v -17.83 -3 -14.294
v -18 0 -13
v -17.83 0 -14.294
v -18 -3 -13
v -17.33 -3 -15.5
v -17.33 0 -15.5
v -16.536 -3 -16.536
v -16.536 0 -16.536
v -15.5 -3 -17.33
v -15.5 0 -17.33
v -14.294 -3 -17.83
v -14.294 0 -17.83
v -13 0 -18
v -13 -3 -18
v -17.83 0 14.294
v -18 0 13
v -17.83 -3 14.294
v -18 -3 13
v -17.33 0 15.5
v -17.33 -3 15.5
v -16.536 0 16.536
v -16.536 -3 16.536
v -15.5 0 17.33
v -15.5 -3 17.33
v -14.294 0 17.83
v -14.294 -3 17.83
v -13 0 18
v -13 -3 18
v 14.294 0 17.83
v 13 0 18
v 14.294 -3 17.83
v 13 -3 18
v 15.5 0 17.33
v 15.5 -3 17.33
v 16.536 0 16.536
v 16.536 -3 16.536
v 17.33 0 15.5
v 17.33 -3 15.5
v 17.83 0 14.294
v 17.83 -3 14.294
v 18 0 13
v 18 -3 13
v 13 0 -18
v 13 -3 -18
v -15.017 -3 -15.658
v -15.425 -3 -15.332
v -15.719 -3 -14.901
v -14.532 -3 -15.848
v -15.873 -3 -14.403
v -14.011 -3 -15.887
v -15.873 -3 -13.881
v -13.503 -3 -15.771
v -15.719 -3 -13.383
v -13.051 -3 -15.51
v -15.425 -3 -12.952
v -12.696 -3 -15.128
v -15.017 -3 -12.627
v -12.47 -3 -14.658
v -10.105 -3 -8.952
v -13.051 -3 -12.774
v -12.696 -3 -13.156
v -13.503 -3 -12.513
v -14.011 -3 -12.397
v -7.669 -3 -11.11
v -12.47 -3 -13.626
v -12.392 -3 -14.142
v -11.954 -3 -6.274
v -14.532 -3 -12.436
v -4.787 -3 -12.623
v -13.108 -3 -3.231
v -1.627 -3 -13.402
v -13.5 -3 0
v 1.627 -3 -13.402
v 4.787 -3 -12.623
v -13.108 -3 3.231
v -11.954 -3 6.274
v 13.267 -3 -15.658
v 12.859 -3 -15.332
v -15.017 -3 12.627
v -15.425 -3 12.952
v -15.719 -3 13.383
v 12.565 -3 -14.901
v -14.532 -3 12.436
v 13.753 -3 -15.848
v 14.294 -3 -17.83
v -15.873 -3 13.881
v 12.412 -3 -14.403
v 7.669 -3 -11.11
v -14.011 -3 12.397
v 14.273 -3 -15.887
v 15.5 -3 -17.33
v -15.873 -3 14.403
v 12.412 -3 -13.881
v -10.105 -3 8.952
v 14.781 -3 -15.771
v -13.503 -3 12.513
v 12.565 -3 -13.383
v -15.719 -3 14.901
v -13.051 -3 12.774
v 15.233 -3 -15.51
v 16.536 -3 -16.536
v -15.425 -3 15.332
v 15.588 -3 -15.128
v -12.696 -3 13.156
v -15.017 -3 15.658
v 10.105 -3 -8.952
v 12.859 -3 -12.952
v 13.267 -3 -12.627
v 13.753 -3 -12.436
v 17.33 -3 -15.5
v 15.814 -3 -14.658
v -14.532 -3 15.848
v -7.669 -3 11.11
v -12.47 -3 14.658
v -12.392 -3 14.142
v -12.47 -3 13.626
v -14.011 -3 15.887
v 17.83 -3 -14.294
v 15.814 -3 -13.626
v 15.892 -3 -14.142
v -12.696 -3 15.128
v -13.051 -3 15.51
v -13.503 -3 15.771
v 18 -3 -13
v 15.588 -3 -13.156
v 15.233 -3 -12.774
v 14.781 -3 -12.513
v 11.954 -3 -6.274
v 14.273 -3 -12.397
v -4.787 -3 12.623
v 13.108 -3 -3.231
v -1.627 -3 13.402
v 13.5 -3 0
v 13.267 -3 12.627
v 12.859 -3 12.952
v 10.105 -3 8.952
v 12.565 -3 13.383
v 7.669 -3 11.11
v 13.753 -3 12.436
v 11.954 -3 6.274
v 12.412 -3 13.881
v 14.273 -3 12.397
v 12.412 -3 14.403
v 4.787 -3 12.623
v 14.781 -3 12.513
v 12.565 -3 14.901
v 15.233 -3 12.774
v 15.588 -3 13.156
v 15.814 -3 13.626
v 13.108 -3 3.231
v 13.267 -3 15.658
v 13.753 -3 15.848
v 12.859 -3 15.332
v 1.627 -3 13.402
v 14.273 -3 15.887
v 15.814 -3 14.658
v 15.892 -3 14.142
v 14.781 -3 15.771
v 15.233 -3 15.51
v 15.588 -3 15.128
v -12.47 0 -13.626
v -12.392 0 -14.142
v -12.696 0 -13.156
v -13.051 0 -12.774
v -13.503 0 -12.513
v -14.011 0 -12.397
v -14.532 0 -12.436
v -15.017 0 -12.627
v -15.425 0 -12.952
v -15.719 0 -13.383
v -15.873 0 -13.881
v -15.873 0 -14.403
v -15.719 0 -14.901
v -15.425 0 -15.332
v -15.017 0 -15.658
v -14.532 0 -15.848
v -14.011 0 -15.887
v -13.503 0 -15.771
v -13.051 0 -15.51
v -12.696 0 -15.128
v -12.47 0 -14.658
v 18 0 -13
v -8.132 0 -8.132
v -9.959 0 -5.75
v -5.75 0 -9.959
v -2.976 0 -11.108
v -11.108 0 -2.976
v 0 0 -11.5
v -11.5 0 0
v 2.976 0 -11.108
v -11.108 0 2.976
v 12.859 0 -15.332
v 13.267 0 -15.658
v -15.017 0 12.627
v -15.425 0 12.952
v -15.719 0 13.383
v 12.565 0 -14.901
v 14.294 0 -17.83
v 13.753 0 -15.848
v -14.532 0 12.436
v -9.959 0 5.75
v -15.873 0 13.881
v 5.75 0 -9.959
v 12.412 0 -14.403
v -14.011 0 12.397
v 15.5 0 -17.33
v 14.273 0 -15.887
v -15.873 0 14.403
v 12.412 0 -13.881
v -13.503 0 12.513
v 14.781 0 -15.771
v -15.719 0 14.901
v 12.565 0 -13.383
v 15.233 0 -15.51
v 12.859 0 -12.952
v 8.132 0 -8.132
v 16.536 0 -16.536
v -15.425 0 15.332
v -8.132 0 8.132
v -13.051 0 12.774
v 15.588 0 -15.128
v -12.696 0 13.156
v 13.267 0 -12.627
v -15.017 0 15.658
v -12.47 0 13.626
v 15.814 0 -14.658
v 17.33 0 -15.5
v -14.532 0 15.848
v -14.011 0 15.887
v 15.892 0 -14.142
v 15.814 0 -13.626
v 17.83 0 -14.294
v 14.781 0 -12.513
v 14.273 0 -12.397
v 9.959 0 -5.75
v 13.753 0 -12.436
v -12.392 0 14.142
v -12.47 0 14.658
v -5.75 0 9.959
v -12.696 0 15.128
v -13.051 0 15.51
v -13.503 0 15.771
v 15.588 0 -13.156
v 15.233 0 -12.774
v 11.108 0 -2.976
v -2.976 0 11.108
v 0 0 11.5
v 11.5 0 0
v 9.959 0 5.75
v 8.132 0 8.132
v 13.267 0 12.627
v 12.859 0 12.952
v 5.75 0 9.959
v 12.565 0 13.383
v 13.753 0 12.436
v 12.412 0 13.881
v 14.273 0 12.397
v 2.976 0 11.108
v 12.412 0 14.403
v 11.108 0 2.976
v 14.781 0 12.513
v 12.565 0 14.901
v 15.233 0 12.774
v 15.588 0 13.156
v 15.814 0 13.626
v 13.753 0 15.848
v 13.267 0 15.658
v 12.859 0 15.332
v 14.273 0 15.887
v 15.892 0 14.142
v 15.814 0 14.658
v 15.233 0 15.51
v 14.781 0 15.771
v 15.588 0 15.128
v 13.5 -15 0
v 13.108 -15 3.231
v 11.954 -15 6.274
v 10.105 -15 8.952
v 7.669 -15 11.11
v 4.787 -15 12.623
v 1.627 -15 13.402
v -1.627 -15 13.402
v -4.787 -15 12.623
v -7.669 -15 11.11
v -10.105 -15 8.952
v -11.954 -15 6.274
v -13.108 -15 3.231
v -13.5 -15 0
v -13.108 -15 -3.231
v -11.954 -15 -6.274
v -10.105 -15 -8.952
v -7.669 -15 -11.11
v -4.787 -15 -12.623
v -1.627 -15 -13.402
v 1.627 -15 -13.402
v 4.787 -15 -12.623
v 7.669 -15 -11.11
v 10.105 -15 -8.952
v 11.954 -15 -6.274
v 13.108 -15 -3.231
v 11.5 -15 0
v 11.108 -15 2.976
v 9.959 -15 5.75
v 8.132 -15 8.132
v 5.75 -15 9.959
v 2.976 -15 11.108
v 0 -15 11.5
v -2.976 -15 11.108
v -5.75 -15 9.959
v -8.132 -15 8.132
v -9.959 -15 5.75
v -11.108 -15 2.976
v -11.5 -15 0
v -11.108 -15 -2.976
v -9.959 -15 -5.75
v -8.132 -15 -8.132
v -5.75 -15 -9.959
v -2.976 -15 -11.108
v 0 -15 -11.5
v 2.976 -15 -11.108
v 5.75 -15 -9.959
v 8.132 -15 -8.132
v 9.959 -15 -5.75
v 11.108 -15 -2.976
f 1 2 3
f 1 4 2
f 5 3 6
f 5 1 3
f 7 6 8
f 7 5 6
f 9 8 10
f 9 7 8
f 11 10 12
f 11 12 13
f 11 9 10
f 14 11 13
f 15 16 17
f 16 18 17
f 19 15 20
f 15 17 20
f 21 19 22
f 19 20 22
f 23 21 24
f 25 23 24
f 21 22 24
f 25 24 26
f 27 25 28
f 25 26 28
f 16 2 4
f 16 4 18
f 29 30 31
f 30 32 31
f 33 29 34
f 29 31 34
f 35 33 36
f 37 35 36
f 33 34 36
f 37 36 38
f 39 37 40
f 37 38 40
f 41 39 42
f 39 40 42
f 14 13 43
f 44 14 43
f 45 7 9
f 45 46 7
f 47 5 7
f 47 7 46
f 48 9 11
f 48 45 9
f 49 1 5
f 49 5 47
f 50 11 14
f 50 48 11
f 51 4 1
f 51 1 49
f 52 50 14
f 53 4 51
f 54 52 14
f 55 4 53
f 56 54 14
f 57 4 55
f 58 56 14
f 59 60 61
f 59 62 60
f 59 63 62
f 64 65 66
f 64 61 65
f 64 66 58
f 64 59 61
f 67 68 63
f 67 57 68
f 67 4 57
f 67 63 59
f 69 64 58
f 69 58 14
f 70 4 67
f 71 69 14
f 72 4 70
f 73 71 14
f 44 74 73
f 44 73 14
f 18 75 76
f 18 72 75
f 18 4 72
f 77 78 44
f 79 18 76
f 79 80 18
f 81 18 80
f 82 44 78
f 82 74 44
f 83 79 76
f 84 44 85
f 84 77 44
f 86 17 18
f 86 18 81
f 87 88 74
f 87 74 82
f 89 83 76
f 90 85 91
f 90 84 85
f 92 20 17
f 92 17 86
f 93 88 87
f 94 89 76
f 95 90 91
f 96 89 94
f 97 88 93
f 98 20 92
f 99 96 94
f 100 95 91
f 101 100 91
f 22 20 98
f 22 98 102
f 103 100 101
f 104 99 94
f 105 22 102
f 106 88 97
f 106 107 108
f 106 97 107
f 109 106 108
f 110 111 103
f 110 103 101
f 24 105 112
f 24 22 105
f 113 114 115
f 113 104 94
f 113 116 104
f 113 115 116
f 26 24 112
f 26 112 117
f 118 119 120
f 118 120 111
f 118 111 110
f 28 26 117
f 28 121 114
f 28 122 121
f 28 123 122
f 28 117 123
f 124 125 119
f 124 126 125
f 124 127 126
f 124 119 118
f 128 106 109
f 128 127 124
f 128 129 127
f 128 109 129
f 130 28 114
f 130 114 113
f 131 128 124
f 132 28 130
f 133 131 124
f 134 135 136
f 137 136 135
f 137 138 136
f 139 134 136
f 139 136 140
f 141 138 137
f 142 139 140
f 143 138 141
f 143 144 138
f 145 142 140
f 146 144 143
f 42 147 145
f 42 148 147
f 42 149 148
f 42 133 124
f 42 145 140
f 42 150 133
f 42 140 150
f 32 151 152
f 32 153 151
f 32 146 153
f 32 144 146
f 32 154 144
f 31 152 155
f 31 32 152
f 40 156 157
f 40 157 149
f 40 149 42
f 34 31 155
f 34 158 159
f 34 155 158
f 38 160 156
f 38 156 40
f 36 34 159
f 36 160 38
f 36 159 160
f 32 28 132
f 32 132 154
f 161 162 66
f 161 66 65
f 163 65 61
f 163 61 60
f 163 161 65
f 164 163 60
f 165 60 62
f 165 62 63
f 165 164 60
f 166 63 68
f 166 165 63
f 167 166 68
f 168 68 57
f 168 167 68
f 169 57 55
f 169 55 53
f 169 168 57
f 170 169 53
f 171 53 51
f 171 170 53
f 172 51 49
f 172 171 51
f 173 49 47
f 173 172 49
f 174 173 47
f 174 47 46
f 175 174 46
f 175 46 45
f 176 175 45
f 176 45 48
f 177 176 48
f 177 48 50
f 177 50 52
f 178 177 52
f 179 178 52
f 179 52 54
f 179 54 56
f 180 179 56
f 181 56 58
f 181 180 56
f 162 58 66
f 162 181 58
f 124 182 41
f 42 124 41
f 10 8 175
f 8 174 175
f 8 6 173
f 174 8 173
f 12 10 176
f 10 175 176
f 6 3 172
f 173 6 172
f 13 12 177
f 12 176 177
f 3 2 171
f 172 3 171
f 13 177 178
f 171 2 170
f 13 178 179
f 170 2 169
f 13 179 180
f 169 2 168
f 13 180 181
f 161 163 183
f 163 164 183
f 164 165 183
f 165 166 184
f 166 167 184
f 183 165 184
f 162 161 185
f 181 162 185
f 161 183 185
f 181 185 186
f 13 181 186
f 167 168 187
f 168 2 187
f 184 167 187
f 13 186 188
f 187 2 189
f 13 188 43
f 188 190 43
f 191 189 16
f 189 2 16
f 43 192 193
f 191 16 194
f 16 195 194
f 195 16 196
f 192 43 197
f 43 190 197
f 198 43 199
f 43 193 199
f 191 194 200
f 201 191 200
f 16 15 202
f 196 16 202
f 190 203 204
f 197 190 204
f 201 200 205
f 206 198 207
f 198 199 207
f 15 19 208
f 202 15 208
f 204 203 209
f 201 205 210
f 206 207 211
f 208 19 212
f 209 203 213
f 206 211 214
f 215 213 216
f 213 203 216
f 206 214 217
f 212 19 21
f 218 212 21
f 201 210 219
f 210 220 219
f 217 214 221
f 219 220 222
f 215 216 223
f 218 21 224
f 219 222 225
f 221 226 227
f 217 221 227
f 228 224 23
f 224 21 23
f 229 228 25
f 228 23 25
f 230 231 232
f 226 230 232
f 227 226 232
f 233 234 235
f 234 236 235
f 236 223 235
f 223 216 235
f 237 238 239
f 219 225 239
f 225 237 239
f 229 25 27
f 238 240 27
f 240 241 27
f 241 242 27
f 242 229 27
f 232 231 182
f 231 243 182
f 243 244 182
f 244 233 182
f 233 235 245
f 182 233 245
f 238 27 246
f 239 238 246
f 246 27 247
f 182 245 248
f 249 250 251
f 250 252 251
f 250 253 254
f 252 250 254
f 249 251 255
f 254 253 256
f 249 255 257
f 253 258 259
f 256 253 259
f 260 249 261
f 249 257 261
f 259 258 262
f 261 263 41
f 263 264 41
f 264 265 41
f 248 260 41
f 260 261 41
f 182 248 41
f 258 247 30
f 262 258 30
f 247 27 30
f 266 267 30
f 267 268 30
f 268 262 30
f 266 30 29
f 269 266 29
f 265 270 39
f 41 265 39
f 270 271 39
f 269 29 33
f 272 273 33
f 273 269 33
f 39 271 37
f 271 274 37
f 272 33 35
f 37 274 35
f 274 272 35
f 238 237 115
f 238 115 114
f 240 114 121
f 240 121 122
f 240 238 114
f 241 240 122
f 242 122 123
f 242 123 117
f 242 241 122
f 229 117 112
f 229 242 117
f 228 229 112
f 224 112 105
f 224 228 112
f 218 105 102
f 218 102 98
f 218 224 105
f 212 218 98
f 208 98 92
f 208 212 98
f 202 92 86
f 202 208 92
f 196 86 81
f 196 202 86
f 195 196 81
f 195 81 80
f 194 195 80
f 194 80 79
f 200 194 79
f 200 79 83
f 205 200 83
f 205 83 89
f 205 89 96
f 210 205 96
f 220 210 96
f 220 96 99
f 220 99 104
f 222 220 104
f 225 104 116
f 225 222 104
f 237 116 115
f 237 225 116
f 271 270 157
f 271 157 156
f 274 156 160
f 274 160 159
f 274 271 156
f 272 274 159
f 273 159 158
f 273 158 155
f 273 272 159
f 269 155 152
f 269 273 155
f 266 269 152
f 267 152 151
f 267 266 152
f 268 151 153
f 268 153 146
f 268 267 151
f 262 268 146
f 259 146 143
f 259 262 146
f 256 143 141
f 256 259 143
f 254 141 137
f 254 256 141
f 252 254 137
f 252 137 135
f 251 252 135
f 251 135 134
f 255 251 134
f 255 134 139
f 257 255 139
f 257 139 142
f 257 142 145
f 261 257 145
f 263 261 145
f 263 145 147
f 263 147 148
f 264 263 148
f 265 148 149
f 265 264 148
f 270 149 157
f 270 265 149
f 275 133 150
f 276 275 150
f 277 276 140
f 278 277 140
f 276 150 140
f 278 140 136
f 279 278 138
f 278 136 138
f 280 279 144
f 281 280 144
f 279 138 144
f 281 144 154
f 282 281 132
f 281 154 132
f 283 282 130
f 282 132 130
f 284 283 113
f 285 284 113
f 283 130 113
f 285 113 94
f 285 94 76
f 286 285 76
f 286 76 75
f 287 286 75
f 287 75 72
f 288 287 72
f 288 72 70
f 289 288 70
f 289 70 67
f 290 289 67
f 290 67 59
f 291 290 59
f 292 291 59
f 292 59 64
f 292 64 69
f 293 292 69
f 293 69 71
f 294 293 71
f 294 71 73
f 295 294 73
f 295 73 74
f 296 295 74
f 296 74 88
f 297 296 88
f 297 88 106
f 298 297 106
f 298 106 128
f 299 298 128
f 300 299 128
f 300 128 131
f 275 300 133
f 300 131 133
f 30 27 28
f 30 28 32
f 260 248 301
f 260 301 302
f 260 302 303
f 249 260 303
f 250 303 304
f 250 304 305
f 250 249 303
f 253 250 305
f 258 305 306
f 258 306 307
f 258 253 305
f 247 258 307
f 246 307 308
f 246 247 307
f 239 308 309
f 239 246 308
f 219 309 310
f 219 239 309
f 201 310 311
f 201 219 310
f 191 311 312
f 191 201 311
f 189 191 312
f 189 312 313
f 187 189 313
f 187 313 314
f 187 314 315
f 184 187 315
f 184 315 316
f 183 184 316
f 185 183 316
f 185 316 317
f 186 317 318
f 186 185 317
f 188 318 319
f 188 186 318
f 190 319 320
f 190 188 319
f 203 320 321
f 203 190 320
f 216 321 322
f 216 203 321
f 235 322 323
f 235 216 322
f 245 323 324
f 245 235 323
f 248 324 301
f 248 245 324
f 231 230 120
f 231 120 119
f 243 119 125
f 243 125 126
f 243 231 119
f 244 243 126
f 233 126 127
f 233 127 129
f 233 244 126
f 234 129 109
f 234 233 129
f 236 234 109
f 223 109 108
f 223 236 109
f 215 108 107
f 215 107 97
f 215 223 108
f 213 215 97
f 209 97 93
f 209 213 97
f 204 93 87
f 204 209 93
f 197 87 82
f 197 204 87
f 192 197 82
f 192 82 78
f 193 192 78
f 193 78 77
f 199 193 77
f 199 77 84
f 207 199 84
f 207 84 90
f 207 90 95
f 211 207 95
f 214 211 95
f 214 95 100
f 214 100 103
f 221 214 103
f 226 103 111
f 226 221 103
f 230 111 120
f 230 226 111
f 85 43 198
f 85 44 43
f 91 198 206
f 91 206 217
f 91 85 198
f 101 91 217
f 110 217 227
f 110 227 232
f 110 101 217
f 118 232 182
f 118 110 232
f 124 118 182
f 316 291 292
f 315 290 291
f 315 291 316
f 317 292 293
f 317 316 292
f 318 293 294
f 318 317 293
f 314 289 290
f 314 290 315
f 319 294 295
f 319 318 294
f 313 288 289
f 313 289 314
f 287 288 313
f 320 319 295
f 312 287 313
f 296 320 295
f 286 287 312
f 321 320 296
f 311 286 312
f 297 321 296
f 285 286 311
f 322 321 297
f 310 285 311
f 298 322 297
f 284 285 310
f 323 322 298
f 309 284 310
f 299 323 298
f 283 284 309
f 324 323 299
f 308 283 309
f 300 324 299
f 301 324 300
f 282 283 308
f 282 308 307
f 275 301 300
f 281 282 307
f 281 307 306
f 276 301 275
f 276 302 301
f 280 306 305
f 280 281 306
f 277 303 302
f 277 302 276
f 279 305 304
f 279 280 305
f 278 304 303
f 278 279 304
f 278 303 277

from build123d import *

# Parameters (mm, degrees)
F0_R     = 13.5
F0_R_2   = 11.5
F1_DEPTH = 15
F0_W     = 36
F0_H     = 36
F0_R_3   = 1.75
F2_DEPTH = 3
F3_R     = 5


with BuildPart() as f1:
    # F0 (on Front) → F1 (new body)
    with BuildSketch(Plane.XZ):
        Circle(F0_R)
        Circle(F0_R_2, mode=Mode.SUBTRACT)
    extrude(amount=F1_DEPTH)

    # F0 (on Front) → F2 (join)
    with BuildSketch(Plane.XZ):
        Rectangle(F0_W, F0_H)
        with Locations((-14.142136, -14.142136)):
            Circle(F0_R_3, mode=Mode.SUBTRACT)
        with Locations((14.142136, -14.142136)):
            Circle(F0_R_3, mode=Mode.SUBTRACT)
        with Locations((-14.142136, 14.142136)):
            Circle(F0_R_3, mode=Mode.SUBTRACT)
        Circle(F0_R, mode=Mode.SUBTRACT)
        with Locations((14.142136, 14.142136)):
            Circle(F0_R_3, mode=Mode.SUBTRACT)
    extrude(amount=F2_DEPTH)

    # F3
    f3_edges = [f1.edges().sort_by_distance(p)[0] for p in [
        (18, -1.5, -18),
        (18, -1.5, 18),
        (-18, -1.5, 18),
        (-18, -1.5, -18),
    ]]
    fillet(f3_edges, radius=F3_R)


solid = f1.part
